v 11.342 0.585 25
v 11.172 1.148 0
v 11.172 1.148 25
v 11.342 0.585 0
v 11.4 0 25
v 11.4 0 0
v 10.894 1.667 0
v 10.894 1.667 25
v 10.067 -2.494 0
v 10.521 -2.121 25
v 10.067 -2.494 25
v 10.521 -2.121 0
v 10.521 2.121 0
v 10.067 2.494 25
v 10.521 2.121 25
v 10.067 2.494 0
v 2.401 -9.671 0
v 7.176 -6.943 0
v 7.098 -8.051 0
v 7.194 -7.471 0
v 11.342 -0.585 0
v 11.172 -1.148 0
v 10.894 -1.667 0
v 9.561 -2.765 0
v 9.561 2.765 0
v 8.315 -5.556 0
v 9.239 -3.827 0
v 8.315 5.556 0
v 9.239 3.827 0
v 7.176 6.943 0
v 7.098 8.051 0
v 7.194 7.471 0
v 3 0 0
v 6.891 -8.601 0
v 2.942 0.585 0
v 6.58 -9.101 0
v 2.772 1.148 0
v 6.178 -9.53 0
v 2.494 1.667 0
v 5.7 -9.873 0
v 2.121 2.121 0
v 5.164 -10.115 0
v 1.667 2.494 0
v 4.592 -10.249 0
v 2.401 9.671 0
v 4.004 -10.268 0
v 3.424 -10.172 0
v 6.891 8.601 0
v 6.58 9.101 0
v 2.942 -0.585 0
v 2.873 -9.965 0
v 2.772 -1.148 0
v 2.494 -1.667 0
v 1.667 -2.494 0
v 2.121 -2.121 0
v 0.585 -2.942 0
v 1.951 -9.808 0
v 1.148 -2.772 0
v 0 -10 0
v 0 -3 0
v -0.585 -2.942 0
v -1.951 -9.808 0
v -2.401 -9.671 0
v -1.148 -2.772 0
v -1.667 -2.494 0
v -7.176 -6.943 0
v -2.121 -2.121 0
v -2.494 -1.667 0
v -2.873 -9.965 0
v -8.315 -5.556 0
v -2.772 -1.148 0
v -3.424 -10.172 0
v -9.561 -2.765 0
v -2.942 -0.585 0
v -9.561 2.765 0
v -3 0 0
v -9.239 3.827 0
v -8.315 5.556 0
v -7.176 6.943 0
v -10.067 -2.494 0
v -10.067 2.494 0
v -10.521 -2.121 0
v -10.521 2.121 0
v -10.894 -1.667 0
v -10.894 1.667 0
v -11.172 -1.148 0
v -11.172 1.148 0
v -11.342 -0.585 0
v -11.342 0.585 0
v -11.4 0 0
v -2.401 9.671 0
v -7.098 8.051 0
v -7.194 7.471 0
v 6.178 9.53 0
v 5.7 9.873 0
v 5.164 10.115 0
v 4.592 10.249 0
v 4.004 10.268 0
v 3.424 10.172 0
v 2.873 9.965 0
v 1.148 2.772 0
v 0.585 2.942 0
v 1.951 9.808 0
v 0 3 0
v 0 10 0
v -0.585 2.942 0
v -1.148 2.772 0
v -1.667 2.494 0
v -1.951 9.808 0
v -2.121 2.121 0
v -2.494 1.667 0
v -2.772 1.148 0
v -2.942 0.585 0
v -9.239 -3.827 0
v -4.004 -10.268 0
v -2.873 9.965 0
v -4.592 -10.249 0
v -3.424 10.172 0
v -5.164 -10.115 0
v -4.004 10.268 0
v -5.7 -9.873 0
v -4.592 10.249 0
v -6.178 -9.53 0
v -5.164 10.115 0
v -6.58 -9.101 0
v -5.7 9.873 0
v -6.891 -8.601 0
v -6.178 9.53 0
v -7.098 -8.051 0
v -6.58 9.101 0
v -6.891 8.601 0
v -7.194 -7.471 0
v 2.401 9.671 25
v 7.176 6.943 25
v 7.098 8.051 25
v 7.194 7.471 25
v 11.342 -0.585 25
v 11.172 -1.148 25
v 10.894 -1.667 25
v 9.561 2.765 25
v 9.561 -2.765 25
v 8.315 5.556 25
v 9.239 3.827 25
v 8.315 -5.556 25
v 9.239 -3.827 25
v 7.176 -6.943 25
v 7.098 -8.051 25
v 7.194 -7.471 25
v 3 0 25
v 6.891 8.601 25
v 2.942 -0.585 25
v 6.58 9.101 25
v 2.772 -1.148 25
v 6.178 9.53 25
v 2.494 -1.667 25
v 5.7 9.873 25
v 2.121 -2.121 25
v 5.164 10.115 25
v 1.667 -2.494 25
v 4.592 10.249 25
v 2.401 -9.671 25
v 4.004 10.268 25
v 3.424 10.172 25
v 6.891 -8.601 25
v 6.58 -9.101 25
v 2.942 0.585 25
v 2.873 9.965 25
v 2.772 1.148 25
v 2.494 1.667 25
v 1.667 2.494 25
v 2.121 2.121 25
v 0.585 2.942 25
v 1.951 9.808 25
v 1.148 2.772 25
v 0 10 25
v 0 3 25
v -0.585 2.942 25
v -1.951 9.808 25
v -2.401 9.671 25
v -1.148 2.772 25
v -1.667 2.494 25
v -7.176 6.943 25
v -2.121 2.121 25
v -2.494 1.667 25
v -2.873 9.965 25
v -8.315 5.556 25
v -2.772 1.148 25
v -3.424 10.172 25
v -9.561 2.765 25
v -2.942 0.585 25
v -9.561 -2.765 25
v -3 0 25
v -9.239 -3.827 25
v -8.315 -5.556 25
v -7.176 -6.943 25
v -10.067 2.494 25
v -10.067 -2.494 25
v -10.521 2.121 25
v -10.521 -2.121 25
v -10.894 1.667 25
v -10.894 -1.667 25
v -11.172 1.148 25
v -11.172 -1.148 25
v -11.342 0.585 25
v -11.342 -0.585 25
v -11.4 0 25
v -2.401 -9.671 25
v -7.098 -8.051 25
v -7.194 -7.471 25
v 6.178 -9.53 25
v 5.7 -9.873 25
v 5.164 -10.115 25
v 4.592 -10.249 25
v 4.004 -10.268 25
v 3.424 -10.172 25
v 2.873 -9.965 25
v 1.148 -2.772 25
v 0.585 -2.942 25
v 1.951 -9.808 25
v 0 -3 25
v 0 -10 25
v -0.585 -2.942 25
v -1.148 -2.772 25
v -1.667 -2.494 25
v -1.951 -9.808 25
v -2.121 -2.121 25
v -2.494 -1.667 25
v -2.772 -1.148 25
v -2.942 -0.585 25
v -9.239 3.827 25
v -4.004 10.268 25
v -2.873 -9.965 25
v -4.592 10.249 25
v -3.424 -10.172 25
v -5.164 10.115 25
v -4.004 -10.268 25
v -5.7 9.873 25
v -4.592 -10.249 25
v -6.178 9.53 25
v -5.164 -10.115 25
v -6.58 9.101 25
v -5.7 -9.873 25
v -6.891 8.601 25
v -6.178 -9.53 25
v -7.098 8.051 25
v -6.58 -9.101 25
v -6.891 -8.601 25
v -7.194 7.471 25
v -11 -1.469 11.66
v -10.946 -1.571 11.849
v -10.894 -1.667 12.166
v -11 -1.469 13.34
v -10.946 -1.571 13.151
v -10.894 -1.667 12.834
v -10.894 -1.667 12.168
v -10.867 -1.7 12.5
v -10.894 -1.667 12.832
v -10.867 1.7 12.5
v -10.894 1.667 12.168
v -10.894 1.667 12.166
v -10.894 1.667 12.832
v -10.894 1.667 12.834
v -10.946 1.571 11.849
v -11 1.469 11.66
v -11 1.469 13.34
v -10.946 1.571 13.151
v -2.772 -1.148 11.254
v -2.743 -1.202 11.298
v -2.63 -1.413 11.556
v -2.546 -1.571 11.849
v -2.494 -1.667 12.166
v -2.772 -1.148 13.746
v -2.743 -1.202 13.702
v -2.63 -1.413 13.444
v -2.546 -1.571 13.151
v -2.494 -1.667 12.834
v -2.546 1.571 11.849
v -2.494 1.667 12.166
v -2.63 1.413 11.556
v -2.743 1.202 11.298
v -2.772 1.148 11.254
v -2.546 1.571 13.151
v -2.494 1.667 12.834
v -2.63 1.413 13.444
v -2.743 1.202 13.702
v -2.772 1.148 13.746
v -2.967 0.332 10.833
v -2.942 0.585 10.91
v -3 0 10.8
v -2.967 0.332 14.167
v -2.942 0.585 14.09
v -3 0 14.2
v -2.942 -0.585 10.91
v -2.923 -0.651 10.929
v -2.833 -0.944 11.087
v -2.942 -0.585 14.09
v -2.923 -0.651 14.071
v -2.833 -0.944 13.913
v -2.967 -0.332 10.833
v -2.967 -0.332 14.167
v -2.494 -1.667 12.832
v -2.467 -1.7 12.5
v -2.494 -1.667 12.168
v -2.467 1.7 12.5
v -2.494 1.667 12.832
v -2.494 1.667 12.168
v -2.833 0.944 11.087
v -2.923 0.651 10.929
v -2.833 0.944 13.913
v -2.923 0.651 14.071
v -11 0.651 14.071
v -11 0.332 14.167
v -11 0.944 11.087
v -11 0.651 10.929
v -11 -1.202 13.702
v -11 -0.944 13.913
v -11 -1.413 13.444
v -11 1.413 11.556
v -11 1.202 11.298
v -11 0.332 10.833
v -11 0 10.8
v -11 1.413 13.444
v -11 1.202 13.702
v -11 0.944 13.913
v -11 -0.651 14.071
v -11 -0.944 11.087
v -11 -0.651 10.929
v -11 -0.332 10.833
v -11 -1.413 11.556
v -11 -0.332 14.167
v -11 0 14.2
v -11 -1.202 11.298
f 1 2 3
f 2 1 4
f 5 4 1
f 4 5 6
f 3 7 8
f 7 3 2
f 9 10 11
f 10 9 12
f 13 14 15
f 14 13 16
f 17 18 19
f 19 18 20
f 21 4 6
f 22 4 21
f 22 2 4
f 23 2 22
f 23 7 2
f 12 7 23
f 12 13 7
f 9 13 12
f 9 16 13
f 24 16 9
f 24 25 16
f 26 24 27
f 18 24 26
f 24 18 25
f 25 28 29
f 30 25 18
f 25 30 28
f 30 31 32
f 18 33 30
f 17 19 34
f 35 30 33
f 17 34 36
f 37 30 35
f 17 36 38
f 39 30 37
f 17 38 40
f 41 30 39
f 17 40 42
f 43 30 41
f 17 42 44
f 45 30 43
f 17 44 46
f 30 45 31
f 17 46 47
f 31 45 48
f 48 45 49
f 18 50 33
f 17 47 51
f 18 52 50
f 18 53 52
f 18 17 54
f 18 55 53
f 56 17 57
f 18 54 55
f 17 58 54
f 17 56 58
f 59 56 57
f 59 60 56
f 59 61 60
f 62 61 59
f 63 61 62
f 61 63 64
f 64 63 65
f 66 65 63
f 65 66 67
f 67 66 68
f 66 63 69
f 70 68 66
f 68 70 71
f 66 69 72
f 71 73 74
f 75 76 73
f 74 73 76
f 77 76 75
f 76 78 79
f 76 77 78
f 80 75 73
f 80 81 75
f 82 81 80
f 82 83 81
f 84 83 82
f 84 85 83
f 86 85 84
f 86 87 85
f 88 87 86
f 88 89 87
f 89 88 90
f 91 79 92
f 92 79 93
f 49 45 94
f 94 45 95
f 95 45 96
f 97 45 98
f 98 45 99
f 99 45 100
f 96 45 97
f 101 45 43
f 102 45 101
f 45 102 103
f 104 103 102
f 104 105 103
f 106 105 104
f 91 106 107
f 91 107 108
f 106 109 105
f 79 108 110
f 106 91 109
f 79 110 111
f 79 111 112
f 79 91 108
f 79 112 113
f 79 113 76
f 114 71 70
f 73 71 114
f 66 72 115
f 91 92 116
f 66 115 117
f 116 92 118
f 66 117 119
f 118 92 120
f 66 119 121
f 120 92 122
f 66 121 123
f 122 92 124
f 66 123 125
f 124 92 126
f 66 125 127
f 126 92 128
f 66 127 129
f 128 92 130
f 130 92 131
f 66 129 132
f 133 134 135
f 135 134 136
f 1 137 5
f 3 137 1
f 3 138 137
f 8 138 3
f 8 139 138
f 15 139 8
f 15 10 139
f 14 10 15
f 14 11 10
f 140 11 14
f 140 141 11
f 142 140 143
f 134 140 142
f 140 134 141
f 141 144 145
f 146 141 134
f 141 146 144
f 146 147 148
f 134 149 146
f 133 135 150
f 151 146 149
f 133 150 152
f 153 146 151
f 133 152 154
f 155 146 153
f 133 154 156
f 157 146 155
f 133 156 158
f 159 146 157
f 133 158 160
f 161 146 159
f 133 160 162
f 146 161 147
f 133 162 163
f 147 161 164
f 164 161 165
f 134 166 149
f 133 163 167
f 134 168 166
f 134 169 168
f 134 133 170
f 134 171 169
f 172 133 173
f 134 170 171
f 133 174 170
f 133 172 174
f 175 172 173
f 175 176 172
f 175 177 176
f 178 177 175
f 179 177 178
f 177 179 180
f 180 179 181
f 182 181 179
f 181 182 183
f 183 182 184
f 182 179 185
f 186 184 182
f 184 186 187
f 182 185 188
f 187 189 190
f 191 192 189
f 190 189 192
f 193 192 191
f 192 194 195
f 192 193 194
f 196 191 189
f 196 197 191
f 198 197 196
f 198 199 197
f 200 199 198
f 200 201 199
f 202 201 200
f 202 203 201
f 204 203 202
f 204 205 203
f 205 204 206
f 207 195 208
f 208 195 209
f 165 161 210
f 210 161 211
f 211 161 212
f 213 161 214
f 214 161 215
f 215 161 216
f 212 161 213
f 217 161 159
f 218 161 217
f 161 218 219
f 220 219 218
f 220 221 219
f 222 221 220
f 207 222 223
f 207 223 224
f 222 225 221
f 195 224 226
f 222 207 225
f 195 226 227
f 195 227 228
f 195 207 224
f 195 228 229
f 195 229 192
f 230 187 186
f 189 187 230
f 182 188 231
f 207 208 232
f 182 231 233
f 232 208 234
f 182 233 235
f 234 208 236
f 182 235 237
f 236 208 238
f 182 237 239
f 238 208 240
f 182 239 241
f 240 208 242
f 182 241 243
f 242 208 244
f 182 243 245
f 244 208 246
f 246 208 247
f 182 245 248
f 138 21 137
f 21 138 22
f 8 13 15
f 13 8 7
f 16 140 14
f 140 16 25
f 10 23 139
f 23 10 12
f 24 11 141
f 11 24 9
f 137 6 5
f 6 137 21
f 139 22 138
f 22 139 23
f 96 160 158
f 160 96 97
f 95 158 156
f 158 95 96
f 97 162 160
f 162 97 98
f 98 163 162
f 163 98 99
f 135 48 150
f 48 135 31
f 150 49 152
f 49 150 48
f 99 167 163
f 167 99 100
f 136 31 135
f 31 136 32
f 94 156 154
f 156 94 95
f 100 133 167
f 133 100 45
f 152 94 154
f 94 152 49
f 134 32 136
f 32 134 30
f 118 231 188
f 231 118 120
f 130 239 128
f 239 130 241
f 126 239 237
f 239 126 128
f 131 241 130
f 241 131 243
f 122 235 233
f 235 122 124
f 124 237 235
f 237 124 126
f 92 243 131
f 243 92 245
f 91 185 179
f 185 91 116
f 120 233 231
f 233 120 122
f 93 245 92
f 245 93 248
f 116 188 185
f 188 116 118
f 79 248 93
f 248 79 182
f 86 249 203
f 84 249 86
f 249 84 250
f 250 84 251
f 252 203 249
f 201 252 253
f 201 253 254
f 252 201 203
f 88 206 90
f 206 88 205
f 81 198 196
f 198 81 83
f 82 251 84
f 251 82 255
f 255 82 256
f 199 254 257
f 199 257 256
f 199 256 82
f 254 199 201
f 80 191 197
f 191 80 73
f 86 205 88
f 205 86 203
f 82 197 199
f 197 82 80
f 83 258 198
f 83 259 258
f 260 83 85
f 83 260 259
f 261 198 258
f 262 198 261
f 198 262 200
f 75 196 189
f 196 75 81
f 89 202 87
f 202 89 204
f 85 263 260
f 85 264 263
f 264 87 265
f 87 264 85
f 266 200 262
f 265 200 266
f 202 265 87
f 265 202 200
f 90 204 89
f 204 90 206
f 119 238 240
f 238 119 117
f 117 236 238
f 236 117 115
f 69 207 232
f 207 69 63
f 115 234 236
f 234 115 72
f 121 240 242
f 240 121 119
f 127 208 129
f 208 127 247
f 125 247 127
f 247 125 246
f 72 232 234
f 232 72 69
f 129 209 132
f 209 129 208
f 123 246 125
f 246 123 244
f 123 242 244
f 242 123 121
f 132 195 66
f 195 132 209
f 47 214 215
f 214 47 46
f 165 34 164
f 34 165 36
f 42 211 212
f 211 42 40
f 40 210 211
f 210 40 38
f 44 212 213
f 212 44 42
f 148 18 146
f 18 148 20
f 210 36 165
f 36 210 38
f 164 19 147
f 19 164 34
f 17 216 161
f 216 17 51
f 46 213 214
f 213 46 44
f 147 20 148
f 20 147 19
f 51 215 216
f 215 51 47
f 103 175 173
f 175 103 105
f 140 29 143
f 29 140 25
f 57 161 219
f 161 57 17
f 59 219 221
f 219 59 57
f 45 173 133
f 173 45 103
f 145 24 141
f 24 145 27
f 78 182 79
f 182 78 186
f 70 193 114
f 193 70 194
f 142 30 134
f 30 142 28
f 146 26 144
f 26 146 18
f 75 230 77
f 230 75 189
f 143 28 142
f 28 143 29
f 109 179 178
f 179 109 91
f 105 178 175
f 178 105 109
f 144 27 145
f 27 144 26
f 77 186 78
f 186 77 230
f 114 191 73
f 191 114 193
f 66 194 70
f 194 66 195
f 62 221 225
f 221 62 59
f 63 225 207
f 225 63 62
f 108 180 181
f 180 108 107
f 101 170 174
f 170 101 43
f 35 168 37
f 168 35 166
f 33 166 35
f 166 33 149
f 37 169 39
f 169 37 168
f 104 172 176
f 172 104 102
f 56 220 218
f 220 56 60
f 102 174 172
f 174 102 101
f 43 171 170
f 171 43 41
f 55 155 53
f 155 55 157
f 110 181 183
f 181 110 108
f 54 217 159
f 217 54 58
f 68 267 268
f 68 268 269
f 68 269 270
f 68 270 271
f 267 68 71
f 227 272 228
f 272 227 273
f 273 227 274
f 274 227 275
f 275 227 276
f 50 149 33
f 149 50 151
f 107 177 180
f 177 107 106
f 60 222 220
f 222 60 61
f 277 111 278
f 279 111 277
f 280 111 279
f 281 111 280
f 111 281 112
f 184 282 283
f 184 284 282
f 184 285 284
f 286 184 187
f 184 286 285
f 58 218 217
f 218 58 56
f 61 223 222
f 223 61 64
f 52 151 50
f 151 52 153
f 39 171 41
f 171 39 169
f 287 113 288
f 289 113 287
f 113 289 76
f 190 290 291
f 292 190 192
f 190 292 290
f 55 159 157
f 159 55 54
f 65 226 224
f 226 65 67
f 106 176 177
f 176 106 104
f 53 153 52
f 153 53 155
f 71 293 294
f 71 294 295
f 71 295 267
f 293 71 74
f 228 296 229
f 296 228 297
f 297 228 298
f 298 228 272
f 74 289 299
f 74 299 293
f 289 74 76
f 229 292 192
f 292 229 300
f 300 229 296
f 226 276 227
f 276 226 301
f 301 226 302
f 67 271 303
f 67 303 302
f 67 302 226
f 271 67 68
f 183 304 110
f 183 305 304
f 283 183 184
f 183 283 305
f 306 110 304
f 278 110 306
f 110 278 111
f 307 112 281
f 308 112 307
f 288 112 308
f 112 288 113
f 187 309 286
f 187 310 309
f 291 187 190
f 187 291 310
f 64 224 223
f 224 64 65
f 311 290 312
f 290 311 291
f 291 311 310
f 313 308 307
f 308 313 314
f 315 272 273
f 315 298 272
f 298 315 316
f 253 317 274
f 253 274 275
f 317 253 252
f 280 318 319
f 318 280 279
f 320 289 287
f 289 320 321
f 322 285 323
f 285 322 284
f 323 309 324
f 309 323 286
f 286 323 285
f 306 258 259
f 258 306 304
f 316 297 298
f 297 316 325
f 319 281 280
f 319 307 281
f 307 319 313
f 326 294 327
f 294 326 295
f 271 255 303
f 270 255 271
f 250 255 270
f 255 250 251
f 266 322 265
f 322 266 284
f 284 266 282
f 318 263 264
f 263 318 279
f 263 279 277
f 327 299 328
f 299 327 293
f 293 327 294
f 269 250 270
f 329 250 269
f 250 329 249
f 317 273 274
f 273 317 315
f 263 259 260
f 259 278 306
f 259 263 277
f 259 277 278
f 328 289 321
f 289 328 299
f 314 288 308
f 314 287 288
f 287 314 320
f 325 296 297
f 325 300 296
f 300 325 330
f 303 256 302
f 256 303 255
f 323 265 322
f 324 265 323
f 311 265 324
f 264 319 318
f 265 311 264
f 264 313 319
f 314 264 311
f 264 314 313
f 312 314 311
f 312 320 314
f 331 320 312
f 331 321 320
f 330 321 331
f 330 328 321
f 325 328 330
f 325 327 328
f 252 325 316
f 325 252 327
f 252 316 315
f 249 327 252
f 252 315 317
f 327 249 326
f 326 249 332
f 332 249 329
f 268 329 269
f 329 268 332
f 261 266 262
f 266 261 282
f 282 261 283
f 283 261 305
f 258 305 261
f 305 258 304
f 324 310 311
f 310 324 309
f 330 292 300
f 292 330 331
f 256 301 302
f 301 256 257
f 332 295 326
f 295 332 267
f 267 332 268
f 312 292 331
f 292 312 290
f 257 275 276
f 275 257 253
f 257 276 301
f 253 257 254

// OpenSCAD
$fn = 32;

// ----------------------------------------------------------------------
// Hand knob: 20 x 20 x 25 mm
// ----------------------------------------------------------------------

// --- parameters (mm) ---
grip_d = 20;              // knob diameter
grip_h = 25;              // knob height
shaft_d = 6;              // shaft bore
set_d = 3.4;              // set screw tap hole
knurl_dia = 0.97;         // knurl groove diameter
lobes = 6;                // grip lobes

module body() {
  cylinder(h = grip_h, d = grip_d);
  for (i = [0 : lobes - 1])
    rotate([0, 0, i * 360 / lobes])
      translate([grip_d * 0.42, 0, 0])
        cylinder(h = grip_h, d = grip_d * 0.3);
}

difference() {
  union() {
    body();
  }
  translate([0, 0, -1]) cylinder(h = grip_h + 0 + 2, d = shaft_d);
  translate([-grip_d / 2 - 1, 0, grip_h * 0.5]) rotate([0, 90, 0]) cylinder(h = grip_d / 2 + 2, d = set_d);
}
